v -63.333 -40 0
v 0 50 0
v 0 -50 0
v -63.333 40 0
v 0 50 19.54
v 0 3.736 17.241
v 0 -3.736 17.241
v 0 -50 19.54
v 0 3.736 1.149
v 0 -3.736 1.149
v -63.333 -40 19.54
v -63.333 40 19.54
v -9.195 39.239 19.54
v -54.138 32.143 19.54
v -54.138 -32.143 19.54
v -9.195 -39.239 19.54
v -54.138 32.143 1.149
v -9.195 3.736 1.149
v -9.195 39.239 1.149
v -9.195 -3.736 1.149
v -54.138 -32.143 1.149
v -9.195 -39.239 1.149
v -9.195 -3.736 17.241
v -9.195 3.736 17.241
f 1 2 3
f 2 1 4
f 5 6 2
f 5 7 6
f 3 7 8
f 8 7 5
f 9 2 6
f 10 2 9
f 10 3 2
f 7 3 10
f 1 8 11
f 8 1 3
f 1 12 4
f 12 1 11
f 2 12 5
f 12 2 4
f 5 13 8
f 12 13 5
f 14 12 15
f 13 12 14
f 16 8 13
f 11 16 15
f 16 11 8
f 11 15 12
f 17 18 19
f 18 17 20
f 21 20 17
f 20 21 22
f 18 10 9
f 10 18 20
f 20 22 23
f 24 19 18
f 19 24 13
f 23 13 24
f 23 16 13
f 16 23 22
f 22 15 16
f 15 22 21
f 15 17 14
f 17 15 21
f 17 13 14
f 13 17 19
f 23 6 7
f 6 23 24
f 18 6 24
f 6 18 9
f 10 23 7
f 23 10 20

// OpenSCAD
// ============================================================
// LO vz. 37 — typ A-180 (řopík) — parametrický model pro 3D tisk
// Katalog ŘOP — klepeto.kuzelovi.cz/rop
// Data: Denkschrift OKH 1941 (via ropiky.cz), viz data/typ-a-180.json
//
// Model: dva SAMOSTATNÉ objekty (korpus + střecha) vyexportované
// zvlášť — střecha pak fyzicky "oddělávací". Vše sedí na Z=0 (buildplate).
//
// POUŽITÍ:
//   openscad -o korpus-1_87.stl -D "scale_denom=87" -D "part=0" ropik-a180.scad
//   openscad -o strecha-1_87.stl -D "scale_denom=87" -D "part=1" ropik-a180.scad
//   scale_denom: 87=H0, 120, 144=N, 72, 48, 35
// ============================================================

/* [Parametry] */
scale_denom = 87;    // jmenovatel měřítka
part = 0;            // 0=korpus, 1=střecha (export zvlášť)
provedeni = "normal";// zeslabene/normal/zesilene
roof_tol_mm = 0.25;  // vůle střechy (mm v měřítku)

// ---------- Data (metry) ----------
W = 8.70;            // šířka týlní stěny (A-180, Denkschrift)
Wf = 6.96;           // šířka plochého čela (poměr 240/300 ze SVG plánu ropiky.cz)
D = 5.51;            // hloubka čelo→tyl (poměr 190/300 ze SVG; label '6,5 m' = max varianta)
h_int = 1.70;        // světlá vnitřní výška střelecké místnosti
h_cor = 1.40;        // vnitřní výška vstupní chodby
w_door = 0.65;       // šířka vchodu

prov = provedeni == "zeslabene" ? [0.60,0.55] : provedeni == "zesilene" ? [1.00,1.20] : [0.80,0.80];
t_wall = prov[0];
t_roof = prov[1];

// ---------- Měřítko ----------
function mm(m) = m * 1000 / scale_denom;

// ---------- Půdorys (rovina XY, čelo -X, týl +X=0 na svislé stěně) ----------
// Kosočtverec: hrot (-D,0), týlní rohy (0,±W/2) — ŠKÁLOVANÉ do mm modelu
S = 1000 / scale_denom;
module hull2d() {
  scale([S, S])
  polygon([           // LICHOBĚŽNÍK — ploché čelo (SVG ropiky.cz), ne hrot!
    [0, -W/2],        // týlní levý roh (týl = rovná stěna s vchodem)
    [0,  W/2],        // týlní pravý roh
    [-D,  Wf/2],      // čelní pravý roh (čelo ploché, užší)
    [-D, -Wf/2],      // čelní levý roh
  ]);
}

// ---------- KORPUS (bez střechy) ----------
module korpus() {
  difference() {
    // masiv zvenku
    linear_extrude(height = mm(h_int))
      hull2d();
    // vnitřní dutina — odsazení stěn (offset -t_wall), od Z=0 výš (podlaha zůstane plná)
    translate([0, 0, mm(0.10)])
      linear_extrude(height = mm(h_int))   // protne strop → otevřený shora
        offset(delta = -mm(t_wall))
          hull2d();
    // vstupní otvor v týlní stěně (průchod v rovině X=0)
    translate([-mm(t_wall) - 1, -mm(w_door)/2, mm(0.10)])
      cube([mm(t_wall) + 2, mm(w_door), mm(h_cor)]);
  }
}

// ---------- STŘECHA (samostatná deska) ----------
module strecha() {
  // deska leží samostatně na buildplate (Z=0) — při tisku zvlášť,
  // na model pak jen položí: spodní hrana = vršek korpusu.
  // Pozor: offset delta na ostrém hrotu nafoukne rohy (delta/sin(úhel/2))
  // → vůle jen roof_tol_mm, žádné velké přesahy (23.10.2026: mm(0.15) udělalo +4.4 mm na hrotu)
  linear_extrude(height = mm(t_roof))
    offset(delta = roof_tol_mm)
      hull2d();
}

// ---------- Export ----------
$fn = 80;
if (part == 0) {
  korpus();
} else {
  strecha();
}

echo(str("LO vz.37 A-180 | 1:", scale_denom, " | part: ", part==0?"KORPUS":"STŘECHA",
         " | Vnější: ", W, "×", D, " m → ", mm(W), "×", mm(D), " mm"));
echo(str("Provedeni: ", provedeni, " | stěna ", t_wall, " m, strop ", t_roof, " m | vůle střechy ", roof_tol_mm, " mm"));
